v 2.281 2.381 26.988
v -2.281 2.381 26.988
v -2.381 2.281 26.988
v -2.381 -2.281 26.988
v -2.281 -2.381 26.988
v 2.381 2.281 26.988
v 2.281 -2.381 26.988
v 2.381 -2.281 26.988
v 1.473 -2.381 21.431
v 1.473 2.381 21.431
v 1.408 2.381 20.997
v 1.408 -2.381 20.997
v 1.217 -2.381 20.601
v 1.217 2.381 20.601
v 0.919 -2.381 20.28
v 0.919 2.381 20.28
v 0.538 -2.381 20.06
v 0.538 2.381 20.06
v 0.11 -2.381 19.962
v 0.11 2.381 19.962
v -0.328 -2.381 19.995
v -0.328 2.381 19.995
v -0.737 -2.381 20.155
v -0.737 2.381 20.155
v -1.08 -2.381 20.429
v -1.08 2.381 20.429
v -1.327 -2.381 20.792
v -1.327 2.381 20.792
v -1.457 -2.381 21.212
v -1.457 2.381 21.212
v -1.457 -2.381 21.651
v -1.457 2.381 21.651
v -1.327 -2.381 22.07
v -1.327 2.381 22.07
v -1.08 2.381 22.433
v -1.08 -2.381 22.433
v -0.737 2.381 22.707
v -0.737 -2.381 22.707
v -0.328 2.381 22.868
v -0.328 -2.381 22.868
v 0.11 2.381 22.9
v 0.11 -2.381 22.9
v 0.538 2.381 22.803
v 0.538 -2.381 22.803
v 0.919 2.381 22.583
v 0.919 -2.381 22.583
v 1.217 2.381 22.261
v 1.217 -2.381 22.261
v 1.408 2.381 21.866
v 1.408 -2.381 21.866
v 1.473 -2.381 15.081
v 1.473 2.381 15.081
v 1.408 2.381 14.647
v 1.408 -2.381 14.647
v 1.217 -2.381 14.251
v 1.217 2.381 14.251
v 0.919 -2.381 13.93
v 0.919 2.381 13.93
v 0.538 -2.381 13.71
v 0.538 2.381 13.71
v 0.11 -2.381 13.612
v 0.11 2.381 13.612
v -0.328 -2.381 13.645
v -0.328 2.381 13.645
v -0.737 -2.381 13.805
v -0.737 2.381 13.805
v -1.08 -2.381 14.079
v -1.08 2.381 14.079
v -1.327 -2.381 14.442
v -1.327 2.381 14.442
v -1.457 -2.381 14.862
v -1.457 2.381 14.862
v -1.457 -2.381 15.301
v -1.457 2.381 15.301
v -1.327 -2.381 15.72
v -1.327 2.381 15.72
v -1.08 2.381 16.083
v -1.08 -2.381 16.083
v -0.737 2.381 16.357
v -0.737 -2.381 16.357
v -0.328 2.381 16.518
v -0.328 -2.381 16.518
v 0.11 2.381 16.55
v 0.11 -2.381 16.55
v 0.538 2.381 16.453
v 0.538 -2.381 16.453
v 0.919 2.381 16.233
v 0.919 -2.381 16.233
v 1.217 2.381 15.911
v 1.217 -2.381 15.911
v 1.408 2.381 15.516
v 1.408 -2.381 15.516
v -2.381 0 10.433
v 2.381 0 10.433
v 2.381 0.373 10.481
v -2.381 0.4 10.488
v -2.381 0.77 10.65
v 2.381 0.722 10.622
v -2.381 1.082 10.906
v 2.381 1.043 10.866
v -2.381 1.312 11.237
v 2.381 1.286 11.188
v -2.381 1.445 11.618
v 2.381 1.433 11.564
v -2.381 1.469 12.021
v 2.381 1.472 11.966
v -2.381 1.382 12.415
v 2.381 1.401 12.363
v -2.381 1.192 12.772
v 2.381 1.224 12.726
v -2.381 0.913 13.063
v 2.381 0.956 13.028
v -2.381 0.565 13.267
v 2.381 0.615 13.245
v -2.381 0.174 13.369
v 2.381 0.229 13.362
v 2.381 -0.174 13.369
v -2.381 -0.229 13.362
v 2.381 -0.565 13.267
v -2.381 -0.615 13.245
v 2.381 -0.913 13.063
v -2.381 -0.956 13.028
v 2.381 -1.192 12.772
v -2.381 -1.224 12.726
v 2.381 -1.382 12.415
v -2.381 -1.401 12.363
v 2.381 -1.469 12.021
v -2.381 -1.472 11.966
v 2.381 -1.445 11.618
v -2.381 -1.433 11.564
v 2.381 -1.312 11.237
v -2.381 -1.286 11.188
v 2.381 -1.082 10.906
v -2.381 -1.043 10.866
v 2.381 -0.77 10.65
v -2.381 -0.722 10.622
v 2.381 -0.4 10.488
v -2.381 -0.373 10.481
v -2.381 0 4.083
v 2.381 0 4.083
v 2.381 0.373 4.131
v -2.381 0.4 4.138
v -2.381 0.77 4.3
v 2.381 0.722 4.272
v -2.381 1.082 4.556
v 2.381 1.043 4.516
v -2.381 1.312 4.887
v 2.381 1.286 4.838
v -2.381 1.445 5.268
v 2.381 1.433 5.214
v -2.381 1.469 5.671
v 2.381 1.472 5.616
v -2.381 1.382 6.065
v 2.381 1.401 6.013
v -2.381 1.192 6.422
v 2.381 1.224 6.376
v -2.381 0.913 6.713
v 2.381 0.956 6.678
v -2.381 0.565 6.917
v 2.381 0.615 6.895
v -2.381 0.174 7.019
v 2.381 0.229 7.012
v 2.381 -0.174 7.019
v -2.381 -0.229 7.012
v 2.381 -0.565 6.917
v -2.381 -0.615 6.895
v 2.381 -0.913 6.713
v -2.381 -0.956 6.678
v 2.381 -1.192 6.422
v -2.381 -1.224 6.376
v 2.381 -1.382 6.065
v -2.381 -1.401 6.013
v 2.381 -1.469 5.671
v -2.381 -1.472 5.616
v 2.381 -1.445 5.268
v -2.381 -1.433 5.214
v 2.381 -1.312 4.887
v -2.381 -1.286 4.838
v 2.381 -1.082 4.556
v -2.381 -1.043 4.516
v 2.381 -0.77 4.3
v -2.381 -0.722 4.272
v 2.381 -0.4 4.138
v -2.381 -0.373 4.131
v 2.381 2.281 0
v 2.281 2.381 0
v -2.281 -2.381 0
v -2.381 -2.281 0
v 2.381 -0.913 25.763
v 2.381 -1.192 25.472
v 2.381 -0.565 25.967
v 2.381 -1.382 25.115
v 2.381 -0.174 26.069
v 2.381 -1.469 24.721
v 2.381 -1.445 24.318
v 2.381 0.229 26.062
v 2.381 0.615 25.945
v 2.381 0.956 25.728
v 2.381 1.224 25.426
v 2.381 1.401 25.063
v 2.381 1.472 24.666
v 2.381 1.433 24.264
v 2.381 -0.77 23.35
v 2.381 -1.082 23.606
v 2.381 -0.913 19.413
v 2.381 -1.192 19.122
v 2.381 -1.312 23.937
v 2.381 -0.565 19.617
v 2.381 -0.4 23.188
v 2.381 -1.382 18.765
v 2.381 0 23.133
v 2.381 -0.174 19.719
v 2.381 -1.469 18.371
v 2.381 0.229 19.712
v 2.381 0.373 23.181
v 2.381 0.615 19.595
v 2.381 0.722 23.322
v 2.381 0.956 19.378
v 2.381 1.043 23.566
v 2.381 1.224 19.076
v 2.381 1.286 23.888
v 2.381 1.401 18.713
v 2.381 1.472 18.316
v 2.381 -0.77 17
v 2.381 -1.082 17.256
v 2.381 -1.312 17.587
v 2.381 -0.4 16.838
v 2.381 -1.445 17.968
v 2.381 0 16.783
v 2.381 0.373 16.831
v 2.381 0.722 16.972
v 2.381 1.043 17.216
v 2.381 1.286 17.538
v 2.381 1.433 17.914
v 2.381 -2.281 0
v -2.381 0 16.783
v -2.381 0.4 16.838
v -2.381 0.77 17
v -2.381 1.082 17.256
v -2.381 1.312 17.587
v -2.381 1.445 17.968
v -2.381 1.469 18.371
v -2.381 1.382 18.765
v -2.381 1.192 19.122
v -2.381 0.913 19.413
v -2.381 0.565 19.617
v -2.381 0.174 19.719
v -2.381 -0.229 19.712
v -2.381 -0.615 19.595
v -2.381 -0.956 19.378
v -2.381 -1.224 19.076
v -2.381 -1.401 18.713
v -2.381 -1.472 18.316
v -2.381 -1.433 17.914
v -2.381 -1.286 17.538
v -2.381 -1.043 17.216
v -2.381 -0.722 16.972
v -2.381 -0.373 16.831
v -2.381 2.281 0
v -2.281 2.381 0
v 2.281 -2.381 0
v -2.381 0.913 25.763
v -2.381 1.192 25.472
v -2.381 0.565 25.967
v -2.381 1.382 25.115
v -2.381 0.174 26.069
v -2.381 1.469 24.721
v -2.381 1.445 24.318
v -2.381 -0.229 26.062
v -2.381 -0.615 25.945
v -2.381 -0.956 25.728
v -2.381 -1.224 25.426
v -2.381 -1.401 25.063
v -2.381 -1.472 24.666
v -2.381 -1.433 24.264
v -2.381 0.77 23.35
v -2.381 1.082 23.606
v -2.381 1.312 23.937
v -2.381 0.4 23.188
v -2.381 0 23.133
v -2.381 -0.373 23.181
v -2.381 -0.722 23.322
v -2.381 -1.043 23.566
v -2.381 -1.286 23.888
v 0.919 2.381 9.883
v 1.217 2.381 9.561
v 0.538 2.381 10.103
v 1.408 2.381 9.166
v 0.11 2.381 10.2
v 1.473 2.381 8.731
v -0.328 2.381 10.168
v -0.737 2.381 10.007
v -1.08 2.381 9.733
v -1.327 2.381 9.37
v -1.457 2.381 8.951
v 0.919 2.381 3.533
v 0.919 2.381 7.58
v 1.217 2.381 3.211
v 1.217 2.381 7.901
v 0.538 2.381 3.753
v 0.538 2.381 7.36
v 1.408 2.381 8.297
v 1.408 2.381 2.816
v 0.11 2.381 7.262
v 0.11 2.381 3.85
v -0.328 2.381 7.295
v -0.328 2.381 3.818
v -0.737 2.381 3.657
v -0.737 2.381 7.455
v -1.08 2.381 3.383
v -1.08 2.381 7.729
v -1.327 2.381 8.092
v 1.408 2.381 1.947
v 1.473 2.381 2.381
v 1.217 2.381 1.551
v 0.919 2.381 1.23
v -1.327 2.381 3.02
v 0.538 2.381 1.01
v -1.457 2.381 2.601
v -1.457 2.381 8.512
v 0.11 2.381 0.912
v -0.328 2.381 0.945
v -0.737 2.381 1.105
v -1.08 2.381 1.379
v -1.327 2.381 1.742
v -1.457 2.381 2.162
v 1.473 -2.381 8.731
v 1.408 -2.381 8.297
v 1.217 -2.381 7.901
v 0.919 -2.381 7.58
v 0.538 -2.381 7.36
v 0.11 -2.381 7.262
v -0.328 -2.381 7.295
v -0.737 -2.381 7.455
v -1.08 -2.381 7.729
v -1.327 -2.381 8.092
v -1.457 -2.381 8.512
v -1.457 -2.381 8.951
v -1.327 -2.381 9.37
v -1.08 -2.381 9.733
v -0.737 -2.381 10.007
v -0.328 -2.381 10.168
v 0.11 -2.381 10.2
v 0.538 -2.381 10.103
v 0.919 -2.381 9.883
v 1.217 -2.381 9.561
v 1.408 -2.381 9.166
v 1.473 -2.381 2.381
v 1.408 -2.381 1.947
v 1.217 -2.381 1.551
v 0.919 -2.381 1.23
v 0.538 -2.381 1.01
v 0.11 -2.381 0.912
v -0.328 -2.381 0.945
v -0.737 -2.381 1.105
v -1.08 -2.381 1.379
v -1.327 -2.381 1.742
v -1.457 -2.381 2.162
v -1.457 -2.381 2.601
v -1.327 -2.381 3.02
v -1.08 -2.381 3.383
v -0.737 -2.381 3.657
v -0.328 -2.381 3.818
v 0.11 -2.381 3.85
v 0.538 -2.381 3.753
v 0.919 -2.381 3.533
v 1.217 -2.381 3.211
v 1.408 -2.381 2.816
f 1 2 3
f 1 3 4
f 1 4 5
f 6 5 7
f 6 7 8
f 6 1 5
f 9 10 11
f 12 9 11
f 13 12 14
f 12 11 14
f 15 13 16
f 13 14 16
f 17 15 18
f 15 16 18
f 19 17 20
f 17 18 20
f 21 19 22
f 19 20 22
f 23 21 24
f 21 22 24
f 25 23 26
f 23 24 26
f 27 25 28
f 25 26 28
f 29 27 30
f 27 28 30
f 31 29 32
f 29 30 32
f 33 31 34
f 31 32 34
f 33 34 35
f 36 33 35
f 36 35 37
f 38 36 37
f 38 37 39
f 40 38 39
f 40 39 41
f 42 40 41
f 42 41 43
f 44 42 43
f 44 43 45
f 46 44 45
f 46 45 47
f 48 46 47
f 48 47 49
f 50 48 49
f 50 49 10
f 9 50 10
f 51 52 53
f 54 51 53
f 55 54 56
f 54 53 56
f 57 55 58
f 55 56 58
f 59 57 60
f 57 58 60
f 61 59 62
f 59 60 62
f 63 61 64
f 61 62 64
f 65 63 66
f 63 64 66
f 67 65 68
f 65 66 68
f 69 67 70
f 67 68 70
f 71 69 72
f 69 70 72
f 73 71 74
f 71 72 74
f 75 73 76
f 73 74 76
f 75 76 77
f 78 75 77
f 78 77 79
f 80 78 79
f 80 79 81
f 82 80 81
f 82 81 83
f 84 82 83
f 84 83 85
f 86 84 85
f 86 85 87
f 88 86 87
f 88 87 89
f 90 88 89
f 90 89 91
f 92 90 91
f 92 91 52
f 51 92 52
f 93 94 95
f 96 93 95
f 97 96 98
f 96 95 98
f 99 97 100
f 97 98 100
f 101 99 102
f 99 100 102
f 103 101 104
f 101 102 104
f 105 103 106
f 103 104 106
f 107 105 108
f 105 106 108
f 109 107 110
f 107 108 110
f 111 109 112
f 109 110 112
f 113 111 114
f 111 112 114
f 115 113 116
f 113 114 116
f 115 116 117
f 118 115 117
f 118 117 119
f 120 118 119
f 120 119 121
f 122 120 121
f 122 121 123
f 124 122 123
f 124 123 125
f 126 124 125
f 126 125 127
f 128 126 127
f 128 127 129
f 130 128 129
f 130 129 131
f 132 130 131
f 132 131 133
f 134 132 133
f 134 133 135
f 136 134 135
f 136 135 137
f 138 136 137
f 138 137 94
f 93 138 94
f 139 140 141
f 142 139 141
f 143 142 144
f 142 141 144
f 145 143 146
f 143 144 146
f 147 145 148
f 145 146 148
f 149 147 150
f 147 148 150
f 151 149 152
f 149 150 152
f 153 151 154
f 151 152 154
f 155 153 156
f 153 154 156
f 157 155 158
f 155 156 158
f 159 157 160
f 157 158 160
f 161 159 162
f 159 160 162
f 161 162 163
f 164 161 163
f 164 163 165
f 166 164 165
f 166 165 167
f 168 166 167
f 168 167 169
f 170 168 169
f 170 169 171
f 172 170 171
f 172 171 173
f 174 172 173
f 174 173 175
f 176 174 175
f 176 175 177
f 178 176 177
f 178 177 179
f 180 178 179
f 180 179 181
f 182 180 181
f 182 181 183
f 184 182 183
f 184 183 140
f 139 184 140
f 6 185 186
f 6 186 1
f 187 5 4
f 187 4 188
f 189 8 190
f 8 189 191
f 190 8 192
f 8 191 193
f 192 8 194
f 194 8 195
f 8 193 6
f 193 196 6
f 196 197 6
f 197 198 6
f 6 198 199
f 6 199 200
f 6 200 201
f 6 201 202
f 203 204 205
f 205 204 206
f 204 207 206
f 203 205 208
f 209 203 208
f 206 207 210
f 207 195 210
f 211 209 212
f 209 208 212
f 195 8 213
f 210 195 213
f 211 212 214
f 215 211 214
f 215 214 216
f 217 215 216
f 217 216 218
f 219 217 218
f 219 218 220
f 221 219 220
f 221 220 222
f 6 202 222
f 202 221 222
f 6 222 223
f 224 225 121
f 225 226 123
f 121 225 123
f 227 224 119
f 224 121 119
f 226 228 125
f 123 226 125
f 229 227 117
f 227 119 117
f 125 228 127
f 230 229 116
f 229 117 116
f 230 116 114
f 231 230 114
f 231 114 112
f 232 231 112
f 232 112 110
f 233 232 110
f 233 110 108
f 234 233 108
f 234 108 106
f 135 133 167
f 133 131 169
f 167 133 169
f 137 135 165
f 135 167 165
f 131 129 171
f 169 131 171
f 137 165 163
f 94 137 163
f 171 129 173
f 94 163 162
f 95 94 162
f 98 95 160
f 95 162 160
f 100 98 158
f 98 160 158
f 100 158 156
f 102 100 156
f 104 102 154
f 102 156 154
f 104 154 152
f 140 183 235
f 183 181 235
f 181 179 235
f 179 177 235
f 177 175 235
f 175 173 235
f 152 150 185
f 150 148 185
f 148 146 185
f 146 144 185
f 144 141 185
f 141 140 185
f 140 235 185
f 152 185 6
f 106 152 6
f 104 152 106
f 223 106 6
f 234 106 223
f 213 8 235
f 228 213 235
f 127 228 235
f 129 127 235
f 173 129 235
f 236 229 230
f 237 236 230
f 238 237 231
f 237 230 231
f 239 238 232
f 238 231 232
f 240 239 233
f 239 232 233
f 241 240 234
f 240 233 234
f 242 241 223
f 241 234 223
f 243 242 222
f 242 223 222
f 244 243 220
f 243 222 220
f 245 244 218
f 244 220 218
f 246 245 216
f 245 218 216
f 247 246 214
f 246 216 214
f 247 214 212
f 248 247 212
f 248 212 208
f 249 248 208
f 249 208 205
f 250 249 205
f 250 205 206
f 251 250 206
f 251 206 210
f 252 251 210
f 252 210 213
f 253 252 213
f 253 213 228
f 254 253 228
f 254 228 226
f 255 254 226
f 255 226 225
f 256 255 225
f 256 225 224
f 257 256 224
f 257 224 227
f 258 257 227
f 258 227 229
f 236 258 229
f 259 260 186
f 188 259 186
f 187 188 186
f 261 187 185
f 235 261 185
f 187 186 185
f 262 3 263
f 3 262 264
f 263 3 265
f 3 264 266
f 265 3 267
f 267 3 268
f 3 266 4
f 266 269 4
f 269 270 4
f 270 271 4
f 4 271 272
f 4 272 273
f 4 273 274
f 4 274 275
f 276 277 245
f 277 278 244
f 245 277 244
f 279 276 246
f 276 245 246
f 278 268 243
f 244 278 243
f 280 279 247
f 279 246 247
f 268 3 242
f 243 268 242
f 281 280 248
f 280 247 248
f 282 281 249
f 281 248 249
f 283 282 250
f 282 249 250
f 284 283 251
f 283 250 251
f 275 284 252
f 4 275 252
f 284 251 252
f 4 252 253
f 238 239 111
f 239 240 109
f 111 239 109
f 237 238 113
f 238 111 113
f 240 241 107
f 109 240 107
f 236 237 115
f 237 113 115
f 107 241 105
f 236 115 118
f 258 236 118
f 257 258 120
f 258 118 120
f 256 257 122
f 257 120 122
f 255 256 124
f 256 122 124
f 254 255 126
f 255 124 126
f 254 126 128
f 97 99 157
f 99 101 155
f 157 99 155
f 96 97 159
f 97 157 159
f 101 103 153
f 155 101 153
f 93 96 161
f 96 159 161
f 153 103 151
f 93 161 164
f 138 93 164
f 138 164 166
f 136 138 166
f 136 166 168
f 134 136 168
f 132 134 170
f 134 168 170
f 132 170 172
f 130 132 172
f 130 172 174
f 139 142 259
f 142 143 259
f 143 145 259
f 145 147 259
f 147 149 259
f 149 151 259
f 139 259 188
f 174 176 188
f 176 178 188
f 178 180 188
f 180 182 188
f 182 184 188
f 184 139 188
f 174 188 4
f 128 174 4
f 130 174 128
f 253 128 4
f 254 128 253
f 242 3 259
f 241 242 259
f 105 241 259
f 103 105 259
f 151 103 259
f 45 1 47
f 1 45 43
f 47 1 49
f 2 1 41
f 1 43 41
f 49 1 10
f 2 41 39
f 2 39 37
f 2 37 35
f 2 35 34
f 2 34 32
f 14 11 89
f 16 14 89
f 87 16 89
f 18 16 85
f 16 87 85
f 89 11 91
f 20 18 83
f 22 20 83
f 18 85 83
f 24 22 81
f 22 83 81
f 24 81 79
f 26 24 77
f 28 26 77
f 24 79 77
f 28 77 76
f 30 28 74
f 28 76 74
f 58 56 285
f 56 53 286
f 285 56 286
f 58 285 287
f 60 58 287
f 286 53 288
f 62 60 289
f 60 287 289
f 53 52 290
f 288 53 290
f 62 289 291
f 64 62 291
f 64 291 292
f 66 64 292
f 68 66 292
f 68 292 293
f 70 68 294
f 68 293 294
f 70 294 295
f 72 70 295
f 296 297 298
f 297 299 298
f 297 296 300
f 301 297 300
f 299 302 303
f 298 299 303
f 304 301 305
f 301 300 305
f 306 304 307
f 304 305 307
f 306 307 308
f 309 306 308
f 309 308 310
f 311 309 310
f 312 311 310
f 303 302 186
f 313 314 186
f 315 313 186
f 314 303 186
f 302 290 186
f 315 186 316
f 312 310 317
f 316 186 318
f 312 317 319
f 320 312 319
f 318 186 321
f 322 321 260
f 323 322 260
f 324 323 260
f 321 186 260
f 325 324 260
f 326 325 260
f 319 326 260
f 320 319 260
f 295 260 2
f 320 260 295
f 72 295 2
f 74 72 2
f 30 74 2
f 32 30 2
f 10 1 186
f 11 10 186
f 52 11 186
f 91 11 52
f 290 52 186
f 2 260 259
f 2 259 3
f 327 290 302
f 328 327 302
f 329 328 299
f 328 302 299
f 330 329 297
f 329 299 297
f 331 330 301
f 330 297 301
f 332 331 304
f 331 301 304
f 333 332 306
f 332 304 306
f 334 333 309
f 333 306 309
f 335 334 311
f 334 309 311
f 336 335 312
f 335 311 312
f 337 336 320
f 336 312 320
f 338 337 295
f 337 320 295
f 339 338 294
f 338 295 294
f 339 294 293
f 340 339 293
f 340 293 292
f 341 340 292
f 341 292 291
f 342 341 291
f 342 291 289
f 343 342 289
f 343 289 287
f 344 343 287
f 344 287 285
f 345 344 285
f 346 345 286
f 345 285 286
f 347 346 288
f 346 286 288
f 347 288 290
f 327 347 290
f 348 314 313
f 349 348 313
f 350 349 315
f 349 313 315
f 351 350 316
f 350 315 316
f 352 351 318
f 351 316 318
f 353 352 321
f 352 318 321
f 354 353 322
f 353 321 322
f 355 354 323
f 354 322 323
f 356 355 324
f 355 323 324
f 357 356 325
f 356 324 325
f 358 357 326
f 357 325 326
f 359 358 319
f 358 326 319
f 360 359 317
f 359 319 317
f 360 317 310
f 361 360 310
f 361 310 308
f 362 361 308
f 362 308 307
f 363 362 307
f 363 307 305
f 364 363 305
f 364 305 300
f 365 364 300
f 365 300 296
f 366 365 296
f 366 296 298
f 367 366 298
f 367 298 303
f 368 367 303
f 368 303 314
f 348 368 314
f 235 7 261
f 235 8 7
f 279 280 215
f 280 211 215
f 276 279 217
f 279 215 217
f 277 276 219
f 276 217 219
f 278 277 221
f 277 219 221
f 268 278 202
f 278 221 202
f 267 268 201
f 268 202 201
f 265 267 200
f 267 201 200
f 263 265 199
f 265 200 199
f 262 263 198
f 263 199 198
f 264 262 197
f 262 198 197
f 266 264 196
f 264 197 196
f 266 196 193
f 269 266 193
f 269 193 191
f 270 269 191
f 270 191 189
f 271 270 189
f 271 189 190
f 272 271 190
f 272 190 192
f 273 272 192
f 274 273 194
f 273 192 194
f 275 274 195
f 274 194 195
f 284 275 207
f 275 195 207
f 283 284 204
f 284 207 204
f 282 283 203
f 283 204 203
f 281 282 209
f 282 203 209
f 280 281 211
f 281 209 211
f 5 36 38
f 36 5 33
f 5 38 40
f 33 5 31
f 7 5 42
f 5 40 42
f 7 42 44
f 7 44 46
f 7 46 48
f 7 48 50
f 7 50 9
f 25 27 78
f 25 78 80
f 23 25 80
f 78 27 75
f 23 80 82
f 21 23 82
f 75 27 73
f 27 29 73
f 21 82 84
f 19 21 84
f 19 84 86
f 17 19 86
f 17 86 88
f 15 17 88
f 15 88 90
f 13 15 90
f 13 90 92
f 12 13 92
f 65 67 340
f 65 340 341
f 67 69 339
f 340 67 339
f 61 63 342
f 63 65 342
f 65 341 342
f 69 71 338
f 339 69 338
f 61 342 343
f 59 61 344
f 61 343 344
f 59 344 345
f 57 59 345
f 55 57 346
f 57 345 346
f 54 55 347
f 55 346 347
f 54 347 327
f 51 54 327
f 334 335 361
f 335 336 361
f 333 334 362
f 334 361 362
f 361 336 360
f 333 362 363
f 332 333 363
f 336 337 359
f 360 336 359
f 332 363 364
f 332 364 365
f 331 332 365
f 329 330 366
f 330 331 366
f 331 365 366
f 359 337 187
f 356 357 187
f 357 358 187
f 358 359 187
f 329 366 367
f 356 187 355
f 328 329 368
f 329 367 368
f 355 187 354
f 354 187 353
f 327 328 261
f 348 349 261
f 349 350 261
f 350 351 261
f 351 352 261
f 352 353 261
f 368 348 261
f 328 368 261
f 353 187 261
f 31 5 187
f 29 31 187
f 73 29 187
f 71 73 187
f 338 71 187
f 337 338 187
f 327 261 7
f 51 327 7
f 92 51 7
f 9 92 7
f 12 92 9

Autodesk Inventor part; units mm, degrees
ref_plane "YZ Plane" through (0, 0, 0) normal (1, 0, 0) x (0, 1, 0)
ref_plane "XZ Plane" through (0, 0, 0) normal (0, 1, 0) x (-1, 0, 0)
ref_plane "XY Plane" through (0, 0, 0) normal (0, 0, 1) x (1, 0, 0)
sketch "Sketch1" plane through (0, 0, 0) normal (0, 0, 1) x (1, 0, 0)
  line L0 (-2.3812, -2.3813) -> (2.3813, -2.3813)
  line L1 (2.3813, -2.3813) -> (2.3812, 2.3812)
  line L2 (2.3812, 2.3812) -> (-2.3813, 2.3812)
  line L3 (-2.3813, 2.3812) -> (-2.3812, -2.3813)
  line L4 (-2.3812, -2.3813) -> (2.3812, 2.3812) construction
  line L5 (2.3813, -2.3813) -> (-2.3813, 2.3812) construction
  point P0 (0, 0)
  dimension "d0" = 4.7625
  dimension "d1" = 4.7625
extrude "Extrusion1" add sketch "Sketch1" along normal blind 26.9875
sketch "Sketch2" plane through (-2.3813, 2.3812, 0) normal (0, 1, 0) x (1, 0, 0)
  line L0 (2.3813, 0) -> (2.3813, -26.9875) construction
  line L1 (4.7625, -26.9875) -> (0, -26.9875) projected
  circle A0 centre (2.3813, -2.3813) radius 1.4732
  circle A1 centre (2.3813, -8.7313) radius 1.4732
  circle A2 centre (2.3813, -15.0813) radius 1.4732
  circle A3 centre (2.3813, -21.4313) radius 1.4732
  circle A4 centre (2.3813, -26.1938) radius 1.4493 construction
  line L2 (4.7625, 0) -> (0, 0) projected
  dimension "d4" = 2.9464
  dimension "d7" = 6.35
  dimension "d12" = 4.7625
  dimension "d13" = 2.3813
extrude "Extrusion2" cut sketch "Sketch2" against normal through all
sketch "Sketch3" plane through (2.3813, -2.3813, 0) normal (1, 0, 0) x (0, 0, -1)
  line L0 (0, 2.3813) -> (-26.9875, 2.3813) construction
  line L1 (-26.9875, 0) -> (-26.9875, 4.7625) projected
  circle A0 centre (-24.6063, 2.3813) radius 1.4732
  circle A1 centre (-18.2563, 2.3813) radius 1.4732
  circle A2 centre (-11.9063, 2.3813) radius 1.4732
  circle A3 centre (-5.5563, 2.3813) radius 1.4732
  dimension "d16" = 2.9464
  dimension "d17" = 2.3813
  dimension "d20" = 6.35
extrude "Extrusion3" cut sketch "Sketch3" against normal through all
chamfer "Chamfer1" distance 0.1 angle 45 4 edges at (-2.3813, 2.3812, 13.4938) (2.3812, 2.3812, 13.4938) (2.3813, -2.3813, 13.4938) (-2.3812, -2.3813, 13.4938)
equation "\"d1\" = d0"
properties part number "Nut Strip" material "Aluminum 6061"
